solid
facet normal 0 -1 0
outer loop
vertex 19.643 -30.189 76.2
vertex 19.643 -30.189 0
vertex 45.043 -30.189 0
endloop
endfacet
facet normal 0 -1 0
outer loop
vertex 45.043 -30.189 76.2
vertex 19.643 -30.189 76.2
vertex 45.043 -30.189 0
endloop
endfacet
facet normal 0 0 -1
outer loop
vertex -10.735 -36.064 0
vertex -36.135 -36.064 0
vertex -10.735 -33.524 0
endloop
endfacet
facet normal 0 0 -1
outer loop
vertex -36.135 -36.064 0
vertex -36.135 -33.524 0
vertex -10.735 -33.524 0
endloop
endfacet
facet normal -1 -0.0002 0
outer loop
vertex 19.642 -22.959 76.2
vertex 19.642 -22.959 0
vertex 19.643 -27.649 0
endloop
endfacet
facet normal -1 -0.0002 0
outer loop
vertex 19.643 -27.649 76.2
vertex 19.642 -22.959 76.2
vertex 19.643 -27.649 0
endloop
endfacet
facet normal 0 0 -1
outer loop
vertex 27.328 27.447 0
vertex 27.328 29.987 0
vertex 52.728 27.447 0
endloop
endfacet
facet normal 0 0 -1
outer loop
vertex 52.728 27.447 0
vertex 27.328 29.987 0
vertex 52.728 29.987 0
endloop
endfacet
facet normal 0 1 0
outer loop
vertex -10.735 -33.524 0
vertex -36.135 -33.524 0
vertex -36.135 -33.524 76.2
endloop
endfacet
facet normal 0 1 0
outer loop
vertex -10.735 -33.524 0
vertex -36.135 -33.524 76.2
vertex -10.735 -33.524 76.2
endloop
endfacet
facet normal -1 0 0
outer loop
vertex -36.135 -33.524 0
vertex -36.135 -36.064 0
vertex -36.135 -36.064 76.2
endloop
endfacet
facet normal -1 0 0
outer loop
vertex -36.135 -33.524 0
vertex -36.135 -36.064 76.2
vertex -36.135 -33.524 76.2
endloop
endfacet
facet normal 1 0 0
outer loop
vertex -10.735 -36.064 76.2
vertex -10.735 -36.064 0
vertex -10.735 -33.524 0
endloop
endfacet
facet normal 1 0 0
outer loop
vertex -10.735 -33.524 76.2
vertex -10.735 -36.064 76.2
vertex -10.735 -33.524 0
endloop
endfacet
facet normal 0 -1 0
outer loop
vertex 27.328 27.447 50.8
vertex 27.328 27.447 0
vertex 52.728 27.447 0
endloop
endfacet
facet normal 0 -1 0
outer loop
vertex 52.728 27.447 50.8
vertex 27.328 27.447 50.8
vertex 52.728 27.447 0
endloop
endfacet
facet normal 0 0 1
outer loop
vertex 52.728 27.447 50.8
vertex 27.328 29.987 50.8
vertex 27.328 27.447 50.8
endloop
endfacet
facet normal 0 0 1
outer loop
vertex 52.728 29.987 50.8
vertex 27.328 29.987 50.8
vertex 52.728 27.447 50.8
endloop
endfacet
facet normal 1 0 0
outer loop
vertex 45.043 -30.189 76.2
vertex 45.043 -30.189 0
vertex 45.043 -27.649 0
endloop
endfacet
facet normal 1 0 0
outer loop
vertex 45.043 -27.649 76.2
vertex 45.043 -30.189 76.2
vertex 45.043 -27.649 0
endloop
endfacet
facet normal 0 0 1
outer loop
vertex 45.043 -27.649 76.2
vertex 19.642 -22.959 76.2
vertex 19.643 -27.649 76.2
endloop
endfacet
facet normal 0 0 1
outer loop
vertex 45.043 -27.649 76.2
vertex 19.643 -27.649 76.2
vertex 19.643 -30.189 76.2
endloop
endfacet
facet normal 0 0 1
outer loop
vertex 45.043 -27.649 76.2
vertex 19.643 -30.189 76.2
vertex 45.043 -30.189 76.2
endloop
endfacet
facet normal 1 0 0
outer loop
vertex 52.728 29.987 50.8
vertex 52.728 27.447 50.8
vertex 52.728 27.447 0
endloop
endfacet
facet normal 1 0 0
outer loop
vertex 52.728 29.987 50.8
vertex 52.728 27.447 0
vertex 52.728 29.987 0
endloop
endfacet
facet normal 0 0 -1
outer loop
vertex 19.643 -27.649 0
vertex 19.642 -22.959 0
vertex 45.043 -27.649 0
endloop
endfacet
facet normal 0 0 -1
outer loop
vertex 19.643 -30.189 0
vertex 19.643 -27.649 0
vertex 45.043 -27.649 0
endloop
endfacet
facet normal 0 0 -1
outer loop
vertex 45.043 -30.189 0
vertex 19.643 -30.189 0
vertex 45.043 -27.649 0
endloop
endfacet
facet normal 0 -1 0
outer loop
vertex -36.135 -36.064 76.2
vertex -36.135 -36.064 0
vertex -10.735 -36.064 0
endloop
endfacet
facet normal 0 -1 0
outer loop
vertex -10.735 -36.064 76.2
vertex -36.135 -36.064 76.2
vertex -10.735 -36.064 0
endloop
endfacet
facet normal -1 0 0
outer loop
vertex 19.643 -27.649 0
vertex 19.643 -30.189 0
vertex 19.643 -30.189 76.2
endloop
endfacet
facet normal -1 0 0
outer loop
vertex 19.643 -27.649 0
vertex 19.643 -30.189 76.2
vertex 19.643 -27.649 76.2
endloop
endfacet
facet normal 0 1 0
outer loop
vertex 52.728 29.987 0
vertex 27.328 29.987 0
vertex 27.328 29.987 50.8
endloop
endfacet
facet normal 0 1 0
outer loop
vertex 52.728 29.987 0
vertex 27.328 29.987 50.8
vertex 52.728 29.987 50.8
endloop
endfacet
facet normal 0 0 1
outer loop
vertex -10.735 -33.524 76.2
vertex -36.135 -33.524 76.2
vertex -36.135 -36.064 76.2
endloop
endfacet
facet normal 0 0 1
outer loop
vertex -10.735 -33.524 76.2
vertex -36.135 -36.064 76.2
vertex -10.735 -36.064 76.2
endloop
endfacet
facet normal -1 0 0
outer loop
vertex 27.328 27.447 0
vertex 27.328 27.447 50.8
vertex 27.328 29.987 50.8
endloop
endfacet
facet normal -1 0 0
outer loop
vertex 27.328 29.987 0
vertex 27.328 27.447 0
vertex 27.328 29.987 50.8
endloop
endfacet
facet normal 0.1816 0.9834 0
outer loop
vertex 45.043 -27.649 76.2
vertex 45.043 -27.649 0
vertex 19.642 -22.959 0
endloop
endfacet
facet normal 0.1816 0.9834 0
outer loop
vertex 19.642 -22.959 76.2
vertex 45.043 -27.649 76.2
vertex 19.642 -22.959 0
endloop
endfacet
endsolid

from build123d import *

# Parameters (mm, degrees)
F0_W     = 25.4
F0_H     = 2.54
F1_DEPTH = 76.2
F3_DEPTH = 35.306
F4_W     = 25.4
F4_H     = 2.54
F5_DEPTH = 76.2
F6_W     = 25.4
F6_H     = 2.54
F7_DEPTH = 50.8


with BuildPart() as f1:
    # F0 (on Top) → F1 (new body)
    with BuildSketch(Plane.XY):
        with Locations((-23.434786, -34.794446)):
            Rectangle(F0_W, F0_H)
    extrude(amount=F1_DEPTH)

    # F2 (on Top) → F3 (cut)
    with BuildSketch(Plane.XY):
        Polygon((39.735686, -23.066446), (-36.424875, -23.655012), (-36.424875, -35.426304), (39.735686, -35.426304), align=None)
    extrude(amount=-F3_DEPTH, mode=Mode.SUBTRACT)


with BuildPart() as f5:
    # F4 (on Top) → F5 (new body)
    with BuildSketch(Plane.XY):
        Polygon((19.642346, -22.959389), (19.642737, -27.648653), (45.042737, -27.648653), align=None)
        with Locations((32.342737, -28.918653)):
            Rectangle(F4_W, F4_H)
    extrude(amount=F5_DEPTH)


with BuildPart() as f7:
    # F6 (on Top) → F7 (new body)
    with BuildSketch(Plane.XY):
        with Locations((40.028127, 28.716524)):
            Rectangle(F6_W, F6_H)
    extrude(amount=F7_DEPTH)


solid = Compound([f1.part, f5.part, f7.part])
